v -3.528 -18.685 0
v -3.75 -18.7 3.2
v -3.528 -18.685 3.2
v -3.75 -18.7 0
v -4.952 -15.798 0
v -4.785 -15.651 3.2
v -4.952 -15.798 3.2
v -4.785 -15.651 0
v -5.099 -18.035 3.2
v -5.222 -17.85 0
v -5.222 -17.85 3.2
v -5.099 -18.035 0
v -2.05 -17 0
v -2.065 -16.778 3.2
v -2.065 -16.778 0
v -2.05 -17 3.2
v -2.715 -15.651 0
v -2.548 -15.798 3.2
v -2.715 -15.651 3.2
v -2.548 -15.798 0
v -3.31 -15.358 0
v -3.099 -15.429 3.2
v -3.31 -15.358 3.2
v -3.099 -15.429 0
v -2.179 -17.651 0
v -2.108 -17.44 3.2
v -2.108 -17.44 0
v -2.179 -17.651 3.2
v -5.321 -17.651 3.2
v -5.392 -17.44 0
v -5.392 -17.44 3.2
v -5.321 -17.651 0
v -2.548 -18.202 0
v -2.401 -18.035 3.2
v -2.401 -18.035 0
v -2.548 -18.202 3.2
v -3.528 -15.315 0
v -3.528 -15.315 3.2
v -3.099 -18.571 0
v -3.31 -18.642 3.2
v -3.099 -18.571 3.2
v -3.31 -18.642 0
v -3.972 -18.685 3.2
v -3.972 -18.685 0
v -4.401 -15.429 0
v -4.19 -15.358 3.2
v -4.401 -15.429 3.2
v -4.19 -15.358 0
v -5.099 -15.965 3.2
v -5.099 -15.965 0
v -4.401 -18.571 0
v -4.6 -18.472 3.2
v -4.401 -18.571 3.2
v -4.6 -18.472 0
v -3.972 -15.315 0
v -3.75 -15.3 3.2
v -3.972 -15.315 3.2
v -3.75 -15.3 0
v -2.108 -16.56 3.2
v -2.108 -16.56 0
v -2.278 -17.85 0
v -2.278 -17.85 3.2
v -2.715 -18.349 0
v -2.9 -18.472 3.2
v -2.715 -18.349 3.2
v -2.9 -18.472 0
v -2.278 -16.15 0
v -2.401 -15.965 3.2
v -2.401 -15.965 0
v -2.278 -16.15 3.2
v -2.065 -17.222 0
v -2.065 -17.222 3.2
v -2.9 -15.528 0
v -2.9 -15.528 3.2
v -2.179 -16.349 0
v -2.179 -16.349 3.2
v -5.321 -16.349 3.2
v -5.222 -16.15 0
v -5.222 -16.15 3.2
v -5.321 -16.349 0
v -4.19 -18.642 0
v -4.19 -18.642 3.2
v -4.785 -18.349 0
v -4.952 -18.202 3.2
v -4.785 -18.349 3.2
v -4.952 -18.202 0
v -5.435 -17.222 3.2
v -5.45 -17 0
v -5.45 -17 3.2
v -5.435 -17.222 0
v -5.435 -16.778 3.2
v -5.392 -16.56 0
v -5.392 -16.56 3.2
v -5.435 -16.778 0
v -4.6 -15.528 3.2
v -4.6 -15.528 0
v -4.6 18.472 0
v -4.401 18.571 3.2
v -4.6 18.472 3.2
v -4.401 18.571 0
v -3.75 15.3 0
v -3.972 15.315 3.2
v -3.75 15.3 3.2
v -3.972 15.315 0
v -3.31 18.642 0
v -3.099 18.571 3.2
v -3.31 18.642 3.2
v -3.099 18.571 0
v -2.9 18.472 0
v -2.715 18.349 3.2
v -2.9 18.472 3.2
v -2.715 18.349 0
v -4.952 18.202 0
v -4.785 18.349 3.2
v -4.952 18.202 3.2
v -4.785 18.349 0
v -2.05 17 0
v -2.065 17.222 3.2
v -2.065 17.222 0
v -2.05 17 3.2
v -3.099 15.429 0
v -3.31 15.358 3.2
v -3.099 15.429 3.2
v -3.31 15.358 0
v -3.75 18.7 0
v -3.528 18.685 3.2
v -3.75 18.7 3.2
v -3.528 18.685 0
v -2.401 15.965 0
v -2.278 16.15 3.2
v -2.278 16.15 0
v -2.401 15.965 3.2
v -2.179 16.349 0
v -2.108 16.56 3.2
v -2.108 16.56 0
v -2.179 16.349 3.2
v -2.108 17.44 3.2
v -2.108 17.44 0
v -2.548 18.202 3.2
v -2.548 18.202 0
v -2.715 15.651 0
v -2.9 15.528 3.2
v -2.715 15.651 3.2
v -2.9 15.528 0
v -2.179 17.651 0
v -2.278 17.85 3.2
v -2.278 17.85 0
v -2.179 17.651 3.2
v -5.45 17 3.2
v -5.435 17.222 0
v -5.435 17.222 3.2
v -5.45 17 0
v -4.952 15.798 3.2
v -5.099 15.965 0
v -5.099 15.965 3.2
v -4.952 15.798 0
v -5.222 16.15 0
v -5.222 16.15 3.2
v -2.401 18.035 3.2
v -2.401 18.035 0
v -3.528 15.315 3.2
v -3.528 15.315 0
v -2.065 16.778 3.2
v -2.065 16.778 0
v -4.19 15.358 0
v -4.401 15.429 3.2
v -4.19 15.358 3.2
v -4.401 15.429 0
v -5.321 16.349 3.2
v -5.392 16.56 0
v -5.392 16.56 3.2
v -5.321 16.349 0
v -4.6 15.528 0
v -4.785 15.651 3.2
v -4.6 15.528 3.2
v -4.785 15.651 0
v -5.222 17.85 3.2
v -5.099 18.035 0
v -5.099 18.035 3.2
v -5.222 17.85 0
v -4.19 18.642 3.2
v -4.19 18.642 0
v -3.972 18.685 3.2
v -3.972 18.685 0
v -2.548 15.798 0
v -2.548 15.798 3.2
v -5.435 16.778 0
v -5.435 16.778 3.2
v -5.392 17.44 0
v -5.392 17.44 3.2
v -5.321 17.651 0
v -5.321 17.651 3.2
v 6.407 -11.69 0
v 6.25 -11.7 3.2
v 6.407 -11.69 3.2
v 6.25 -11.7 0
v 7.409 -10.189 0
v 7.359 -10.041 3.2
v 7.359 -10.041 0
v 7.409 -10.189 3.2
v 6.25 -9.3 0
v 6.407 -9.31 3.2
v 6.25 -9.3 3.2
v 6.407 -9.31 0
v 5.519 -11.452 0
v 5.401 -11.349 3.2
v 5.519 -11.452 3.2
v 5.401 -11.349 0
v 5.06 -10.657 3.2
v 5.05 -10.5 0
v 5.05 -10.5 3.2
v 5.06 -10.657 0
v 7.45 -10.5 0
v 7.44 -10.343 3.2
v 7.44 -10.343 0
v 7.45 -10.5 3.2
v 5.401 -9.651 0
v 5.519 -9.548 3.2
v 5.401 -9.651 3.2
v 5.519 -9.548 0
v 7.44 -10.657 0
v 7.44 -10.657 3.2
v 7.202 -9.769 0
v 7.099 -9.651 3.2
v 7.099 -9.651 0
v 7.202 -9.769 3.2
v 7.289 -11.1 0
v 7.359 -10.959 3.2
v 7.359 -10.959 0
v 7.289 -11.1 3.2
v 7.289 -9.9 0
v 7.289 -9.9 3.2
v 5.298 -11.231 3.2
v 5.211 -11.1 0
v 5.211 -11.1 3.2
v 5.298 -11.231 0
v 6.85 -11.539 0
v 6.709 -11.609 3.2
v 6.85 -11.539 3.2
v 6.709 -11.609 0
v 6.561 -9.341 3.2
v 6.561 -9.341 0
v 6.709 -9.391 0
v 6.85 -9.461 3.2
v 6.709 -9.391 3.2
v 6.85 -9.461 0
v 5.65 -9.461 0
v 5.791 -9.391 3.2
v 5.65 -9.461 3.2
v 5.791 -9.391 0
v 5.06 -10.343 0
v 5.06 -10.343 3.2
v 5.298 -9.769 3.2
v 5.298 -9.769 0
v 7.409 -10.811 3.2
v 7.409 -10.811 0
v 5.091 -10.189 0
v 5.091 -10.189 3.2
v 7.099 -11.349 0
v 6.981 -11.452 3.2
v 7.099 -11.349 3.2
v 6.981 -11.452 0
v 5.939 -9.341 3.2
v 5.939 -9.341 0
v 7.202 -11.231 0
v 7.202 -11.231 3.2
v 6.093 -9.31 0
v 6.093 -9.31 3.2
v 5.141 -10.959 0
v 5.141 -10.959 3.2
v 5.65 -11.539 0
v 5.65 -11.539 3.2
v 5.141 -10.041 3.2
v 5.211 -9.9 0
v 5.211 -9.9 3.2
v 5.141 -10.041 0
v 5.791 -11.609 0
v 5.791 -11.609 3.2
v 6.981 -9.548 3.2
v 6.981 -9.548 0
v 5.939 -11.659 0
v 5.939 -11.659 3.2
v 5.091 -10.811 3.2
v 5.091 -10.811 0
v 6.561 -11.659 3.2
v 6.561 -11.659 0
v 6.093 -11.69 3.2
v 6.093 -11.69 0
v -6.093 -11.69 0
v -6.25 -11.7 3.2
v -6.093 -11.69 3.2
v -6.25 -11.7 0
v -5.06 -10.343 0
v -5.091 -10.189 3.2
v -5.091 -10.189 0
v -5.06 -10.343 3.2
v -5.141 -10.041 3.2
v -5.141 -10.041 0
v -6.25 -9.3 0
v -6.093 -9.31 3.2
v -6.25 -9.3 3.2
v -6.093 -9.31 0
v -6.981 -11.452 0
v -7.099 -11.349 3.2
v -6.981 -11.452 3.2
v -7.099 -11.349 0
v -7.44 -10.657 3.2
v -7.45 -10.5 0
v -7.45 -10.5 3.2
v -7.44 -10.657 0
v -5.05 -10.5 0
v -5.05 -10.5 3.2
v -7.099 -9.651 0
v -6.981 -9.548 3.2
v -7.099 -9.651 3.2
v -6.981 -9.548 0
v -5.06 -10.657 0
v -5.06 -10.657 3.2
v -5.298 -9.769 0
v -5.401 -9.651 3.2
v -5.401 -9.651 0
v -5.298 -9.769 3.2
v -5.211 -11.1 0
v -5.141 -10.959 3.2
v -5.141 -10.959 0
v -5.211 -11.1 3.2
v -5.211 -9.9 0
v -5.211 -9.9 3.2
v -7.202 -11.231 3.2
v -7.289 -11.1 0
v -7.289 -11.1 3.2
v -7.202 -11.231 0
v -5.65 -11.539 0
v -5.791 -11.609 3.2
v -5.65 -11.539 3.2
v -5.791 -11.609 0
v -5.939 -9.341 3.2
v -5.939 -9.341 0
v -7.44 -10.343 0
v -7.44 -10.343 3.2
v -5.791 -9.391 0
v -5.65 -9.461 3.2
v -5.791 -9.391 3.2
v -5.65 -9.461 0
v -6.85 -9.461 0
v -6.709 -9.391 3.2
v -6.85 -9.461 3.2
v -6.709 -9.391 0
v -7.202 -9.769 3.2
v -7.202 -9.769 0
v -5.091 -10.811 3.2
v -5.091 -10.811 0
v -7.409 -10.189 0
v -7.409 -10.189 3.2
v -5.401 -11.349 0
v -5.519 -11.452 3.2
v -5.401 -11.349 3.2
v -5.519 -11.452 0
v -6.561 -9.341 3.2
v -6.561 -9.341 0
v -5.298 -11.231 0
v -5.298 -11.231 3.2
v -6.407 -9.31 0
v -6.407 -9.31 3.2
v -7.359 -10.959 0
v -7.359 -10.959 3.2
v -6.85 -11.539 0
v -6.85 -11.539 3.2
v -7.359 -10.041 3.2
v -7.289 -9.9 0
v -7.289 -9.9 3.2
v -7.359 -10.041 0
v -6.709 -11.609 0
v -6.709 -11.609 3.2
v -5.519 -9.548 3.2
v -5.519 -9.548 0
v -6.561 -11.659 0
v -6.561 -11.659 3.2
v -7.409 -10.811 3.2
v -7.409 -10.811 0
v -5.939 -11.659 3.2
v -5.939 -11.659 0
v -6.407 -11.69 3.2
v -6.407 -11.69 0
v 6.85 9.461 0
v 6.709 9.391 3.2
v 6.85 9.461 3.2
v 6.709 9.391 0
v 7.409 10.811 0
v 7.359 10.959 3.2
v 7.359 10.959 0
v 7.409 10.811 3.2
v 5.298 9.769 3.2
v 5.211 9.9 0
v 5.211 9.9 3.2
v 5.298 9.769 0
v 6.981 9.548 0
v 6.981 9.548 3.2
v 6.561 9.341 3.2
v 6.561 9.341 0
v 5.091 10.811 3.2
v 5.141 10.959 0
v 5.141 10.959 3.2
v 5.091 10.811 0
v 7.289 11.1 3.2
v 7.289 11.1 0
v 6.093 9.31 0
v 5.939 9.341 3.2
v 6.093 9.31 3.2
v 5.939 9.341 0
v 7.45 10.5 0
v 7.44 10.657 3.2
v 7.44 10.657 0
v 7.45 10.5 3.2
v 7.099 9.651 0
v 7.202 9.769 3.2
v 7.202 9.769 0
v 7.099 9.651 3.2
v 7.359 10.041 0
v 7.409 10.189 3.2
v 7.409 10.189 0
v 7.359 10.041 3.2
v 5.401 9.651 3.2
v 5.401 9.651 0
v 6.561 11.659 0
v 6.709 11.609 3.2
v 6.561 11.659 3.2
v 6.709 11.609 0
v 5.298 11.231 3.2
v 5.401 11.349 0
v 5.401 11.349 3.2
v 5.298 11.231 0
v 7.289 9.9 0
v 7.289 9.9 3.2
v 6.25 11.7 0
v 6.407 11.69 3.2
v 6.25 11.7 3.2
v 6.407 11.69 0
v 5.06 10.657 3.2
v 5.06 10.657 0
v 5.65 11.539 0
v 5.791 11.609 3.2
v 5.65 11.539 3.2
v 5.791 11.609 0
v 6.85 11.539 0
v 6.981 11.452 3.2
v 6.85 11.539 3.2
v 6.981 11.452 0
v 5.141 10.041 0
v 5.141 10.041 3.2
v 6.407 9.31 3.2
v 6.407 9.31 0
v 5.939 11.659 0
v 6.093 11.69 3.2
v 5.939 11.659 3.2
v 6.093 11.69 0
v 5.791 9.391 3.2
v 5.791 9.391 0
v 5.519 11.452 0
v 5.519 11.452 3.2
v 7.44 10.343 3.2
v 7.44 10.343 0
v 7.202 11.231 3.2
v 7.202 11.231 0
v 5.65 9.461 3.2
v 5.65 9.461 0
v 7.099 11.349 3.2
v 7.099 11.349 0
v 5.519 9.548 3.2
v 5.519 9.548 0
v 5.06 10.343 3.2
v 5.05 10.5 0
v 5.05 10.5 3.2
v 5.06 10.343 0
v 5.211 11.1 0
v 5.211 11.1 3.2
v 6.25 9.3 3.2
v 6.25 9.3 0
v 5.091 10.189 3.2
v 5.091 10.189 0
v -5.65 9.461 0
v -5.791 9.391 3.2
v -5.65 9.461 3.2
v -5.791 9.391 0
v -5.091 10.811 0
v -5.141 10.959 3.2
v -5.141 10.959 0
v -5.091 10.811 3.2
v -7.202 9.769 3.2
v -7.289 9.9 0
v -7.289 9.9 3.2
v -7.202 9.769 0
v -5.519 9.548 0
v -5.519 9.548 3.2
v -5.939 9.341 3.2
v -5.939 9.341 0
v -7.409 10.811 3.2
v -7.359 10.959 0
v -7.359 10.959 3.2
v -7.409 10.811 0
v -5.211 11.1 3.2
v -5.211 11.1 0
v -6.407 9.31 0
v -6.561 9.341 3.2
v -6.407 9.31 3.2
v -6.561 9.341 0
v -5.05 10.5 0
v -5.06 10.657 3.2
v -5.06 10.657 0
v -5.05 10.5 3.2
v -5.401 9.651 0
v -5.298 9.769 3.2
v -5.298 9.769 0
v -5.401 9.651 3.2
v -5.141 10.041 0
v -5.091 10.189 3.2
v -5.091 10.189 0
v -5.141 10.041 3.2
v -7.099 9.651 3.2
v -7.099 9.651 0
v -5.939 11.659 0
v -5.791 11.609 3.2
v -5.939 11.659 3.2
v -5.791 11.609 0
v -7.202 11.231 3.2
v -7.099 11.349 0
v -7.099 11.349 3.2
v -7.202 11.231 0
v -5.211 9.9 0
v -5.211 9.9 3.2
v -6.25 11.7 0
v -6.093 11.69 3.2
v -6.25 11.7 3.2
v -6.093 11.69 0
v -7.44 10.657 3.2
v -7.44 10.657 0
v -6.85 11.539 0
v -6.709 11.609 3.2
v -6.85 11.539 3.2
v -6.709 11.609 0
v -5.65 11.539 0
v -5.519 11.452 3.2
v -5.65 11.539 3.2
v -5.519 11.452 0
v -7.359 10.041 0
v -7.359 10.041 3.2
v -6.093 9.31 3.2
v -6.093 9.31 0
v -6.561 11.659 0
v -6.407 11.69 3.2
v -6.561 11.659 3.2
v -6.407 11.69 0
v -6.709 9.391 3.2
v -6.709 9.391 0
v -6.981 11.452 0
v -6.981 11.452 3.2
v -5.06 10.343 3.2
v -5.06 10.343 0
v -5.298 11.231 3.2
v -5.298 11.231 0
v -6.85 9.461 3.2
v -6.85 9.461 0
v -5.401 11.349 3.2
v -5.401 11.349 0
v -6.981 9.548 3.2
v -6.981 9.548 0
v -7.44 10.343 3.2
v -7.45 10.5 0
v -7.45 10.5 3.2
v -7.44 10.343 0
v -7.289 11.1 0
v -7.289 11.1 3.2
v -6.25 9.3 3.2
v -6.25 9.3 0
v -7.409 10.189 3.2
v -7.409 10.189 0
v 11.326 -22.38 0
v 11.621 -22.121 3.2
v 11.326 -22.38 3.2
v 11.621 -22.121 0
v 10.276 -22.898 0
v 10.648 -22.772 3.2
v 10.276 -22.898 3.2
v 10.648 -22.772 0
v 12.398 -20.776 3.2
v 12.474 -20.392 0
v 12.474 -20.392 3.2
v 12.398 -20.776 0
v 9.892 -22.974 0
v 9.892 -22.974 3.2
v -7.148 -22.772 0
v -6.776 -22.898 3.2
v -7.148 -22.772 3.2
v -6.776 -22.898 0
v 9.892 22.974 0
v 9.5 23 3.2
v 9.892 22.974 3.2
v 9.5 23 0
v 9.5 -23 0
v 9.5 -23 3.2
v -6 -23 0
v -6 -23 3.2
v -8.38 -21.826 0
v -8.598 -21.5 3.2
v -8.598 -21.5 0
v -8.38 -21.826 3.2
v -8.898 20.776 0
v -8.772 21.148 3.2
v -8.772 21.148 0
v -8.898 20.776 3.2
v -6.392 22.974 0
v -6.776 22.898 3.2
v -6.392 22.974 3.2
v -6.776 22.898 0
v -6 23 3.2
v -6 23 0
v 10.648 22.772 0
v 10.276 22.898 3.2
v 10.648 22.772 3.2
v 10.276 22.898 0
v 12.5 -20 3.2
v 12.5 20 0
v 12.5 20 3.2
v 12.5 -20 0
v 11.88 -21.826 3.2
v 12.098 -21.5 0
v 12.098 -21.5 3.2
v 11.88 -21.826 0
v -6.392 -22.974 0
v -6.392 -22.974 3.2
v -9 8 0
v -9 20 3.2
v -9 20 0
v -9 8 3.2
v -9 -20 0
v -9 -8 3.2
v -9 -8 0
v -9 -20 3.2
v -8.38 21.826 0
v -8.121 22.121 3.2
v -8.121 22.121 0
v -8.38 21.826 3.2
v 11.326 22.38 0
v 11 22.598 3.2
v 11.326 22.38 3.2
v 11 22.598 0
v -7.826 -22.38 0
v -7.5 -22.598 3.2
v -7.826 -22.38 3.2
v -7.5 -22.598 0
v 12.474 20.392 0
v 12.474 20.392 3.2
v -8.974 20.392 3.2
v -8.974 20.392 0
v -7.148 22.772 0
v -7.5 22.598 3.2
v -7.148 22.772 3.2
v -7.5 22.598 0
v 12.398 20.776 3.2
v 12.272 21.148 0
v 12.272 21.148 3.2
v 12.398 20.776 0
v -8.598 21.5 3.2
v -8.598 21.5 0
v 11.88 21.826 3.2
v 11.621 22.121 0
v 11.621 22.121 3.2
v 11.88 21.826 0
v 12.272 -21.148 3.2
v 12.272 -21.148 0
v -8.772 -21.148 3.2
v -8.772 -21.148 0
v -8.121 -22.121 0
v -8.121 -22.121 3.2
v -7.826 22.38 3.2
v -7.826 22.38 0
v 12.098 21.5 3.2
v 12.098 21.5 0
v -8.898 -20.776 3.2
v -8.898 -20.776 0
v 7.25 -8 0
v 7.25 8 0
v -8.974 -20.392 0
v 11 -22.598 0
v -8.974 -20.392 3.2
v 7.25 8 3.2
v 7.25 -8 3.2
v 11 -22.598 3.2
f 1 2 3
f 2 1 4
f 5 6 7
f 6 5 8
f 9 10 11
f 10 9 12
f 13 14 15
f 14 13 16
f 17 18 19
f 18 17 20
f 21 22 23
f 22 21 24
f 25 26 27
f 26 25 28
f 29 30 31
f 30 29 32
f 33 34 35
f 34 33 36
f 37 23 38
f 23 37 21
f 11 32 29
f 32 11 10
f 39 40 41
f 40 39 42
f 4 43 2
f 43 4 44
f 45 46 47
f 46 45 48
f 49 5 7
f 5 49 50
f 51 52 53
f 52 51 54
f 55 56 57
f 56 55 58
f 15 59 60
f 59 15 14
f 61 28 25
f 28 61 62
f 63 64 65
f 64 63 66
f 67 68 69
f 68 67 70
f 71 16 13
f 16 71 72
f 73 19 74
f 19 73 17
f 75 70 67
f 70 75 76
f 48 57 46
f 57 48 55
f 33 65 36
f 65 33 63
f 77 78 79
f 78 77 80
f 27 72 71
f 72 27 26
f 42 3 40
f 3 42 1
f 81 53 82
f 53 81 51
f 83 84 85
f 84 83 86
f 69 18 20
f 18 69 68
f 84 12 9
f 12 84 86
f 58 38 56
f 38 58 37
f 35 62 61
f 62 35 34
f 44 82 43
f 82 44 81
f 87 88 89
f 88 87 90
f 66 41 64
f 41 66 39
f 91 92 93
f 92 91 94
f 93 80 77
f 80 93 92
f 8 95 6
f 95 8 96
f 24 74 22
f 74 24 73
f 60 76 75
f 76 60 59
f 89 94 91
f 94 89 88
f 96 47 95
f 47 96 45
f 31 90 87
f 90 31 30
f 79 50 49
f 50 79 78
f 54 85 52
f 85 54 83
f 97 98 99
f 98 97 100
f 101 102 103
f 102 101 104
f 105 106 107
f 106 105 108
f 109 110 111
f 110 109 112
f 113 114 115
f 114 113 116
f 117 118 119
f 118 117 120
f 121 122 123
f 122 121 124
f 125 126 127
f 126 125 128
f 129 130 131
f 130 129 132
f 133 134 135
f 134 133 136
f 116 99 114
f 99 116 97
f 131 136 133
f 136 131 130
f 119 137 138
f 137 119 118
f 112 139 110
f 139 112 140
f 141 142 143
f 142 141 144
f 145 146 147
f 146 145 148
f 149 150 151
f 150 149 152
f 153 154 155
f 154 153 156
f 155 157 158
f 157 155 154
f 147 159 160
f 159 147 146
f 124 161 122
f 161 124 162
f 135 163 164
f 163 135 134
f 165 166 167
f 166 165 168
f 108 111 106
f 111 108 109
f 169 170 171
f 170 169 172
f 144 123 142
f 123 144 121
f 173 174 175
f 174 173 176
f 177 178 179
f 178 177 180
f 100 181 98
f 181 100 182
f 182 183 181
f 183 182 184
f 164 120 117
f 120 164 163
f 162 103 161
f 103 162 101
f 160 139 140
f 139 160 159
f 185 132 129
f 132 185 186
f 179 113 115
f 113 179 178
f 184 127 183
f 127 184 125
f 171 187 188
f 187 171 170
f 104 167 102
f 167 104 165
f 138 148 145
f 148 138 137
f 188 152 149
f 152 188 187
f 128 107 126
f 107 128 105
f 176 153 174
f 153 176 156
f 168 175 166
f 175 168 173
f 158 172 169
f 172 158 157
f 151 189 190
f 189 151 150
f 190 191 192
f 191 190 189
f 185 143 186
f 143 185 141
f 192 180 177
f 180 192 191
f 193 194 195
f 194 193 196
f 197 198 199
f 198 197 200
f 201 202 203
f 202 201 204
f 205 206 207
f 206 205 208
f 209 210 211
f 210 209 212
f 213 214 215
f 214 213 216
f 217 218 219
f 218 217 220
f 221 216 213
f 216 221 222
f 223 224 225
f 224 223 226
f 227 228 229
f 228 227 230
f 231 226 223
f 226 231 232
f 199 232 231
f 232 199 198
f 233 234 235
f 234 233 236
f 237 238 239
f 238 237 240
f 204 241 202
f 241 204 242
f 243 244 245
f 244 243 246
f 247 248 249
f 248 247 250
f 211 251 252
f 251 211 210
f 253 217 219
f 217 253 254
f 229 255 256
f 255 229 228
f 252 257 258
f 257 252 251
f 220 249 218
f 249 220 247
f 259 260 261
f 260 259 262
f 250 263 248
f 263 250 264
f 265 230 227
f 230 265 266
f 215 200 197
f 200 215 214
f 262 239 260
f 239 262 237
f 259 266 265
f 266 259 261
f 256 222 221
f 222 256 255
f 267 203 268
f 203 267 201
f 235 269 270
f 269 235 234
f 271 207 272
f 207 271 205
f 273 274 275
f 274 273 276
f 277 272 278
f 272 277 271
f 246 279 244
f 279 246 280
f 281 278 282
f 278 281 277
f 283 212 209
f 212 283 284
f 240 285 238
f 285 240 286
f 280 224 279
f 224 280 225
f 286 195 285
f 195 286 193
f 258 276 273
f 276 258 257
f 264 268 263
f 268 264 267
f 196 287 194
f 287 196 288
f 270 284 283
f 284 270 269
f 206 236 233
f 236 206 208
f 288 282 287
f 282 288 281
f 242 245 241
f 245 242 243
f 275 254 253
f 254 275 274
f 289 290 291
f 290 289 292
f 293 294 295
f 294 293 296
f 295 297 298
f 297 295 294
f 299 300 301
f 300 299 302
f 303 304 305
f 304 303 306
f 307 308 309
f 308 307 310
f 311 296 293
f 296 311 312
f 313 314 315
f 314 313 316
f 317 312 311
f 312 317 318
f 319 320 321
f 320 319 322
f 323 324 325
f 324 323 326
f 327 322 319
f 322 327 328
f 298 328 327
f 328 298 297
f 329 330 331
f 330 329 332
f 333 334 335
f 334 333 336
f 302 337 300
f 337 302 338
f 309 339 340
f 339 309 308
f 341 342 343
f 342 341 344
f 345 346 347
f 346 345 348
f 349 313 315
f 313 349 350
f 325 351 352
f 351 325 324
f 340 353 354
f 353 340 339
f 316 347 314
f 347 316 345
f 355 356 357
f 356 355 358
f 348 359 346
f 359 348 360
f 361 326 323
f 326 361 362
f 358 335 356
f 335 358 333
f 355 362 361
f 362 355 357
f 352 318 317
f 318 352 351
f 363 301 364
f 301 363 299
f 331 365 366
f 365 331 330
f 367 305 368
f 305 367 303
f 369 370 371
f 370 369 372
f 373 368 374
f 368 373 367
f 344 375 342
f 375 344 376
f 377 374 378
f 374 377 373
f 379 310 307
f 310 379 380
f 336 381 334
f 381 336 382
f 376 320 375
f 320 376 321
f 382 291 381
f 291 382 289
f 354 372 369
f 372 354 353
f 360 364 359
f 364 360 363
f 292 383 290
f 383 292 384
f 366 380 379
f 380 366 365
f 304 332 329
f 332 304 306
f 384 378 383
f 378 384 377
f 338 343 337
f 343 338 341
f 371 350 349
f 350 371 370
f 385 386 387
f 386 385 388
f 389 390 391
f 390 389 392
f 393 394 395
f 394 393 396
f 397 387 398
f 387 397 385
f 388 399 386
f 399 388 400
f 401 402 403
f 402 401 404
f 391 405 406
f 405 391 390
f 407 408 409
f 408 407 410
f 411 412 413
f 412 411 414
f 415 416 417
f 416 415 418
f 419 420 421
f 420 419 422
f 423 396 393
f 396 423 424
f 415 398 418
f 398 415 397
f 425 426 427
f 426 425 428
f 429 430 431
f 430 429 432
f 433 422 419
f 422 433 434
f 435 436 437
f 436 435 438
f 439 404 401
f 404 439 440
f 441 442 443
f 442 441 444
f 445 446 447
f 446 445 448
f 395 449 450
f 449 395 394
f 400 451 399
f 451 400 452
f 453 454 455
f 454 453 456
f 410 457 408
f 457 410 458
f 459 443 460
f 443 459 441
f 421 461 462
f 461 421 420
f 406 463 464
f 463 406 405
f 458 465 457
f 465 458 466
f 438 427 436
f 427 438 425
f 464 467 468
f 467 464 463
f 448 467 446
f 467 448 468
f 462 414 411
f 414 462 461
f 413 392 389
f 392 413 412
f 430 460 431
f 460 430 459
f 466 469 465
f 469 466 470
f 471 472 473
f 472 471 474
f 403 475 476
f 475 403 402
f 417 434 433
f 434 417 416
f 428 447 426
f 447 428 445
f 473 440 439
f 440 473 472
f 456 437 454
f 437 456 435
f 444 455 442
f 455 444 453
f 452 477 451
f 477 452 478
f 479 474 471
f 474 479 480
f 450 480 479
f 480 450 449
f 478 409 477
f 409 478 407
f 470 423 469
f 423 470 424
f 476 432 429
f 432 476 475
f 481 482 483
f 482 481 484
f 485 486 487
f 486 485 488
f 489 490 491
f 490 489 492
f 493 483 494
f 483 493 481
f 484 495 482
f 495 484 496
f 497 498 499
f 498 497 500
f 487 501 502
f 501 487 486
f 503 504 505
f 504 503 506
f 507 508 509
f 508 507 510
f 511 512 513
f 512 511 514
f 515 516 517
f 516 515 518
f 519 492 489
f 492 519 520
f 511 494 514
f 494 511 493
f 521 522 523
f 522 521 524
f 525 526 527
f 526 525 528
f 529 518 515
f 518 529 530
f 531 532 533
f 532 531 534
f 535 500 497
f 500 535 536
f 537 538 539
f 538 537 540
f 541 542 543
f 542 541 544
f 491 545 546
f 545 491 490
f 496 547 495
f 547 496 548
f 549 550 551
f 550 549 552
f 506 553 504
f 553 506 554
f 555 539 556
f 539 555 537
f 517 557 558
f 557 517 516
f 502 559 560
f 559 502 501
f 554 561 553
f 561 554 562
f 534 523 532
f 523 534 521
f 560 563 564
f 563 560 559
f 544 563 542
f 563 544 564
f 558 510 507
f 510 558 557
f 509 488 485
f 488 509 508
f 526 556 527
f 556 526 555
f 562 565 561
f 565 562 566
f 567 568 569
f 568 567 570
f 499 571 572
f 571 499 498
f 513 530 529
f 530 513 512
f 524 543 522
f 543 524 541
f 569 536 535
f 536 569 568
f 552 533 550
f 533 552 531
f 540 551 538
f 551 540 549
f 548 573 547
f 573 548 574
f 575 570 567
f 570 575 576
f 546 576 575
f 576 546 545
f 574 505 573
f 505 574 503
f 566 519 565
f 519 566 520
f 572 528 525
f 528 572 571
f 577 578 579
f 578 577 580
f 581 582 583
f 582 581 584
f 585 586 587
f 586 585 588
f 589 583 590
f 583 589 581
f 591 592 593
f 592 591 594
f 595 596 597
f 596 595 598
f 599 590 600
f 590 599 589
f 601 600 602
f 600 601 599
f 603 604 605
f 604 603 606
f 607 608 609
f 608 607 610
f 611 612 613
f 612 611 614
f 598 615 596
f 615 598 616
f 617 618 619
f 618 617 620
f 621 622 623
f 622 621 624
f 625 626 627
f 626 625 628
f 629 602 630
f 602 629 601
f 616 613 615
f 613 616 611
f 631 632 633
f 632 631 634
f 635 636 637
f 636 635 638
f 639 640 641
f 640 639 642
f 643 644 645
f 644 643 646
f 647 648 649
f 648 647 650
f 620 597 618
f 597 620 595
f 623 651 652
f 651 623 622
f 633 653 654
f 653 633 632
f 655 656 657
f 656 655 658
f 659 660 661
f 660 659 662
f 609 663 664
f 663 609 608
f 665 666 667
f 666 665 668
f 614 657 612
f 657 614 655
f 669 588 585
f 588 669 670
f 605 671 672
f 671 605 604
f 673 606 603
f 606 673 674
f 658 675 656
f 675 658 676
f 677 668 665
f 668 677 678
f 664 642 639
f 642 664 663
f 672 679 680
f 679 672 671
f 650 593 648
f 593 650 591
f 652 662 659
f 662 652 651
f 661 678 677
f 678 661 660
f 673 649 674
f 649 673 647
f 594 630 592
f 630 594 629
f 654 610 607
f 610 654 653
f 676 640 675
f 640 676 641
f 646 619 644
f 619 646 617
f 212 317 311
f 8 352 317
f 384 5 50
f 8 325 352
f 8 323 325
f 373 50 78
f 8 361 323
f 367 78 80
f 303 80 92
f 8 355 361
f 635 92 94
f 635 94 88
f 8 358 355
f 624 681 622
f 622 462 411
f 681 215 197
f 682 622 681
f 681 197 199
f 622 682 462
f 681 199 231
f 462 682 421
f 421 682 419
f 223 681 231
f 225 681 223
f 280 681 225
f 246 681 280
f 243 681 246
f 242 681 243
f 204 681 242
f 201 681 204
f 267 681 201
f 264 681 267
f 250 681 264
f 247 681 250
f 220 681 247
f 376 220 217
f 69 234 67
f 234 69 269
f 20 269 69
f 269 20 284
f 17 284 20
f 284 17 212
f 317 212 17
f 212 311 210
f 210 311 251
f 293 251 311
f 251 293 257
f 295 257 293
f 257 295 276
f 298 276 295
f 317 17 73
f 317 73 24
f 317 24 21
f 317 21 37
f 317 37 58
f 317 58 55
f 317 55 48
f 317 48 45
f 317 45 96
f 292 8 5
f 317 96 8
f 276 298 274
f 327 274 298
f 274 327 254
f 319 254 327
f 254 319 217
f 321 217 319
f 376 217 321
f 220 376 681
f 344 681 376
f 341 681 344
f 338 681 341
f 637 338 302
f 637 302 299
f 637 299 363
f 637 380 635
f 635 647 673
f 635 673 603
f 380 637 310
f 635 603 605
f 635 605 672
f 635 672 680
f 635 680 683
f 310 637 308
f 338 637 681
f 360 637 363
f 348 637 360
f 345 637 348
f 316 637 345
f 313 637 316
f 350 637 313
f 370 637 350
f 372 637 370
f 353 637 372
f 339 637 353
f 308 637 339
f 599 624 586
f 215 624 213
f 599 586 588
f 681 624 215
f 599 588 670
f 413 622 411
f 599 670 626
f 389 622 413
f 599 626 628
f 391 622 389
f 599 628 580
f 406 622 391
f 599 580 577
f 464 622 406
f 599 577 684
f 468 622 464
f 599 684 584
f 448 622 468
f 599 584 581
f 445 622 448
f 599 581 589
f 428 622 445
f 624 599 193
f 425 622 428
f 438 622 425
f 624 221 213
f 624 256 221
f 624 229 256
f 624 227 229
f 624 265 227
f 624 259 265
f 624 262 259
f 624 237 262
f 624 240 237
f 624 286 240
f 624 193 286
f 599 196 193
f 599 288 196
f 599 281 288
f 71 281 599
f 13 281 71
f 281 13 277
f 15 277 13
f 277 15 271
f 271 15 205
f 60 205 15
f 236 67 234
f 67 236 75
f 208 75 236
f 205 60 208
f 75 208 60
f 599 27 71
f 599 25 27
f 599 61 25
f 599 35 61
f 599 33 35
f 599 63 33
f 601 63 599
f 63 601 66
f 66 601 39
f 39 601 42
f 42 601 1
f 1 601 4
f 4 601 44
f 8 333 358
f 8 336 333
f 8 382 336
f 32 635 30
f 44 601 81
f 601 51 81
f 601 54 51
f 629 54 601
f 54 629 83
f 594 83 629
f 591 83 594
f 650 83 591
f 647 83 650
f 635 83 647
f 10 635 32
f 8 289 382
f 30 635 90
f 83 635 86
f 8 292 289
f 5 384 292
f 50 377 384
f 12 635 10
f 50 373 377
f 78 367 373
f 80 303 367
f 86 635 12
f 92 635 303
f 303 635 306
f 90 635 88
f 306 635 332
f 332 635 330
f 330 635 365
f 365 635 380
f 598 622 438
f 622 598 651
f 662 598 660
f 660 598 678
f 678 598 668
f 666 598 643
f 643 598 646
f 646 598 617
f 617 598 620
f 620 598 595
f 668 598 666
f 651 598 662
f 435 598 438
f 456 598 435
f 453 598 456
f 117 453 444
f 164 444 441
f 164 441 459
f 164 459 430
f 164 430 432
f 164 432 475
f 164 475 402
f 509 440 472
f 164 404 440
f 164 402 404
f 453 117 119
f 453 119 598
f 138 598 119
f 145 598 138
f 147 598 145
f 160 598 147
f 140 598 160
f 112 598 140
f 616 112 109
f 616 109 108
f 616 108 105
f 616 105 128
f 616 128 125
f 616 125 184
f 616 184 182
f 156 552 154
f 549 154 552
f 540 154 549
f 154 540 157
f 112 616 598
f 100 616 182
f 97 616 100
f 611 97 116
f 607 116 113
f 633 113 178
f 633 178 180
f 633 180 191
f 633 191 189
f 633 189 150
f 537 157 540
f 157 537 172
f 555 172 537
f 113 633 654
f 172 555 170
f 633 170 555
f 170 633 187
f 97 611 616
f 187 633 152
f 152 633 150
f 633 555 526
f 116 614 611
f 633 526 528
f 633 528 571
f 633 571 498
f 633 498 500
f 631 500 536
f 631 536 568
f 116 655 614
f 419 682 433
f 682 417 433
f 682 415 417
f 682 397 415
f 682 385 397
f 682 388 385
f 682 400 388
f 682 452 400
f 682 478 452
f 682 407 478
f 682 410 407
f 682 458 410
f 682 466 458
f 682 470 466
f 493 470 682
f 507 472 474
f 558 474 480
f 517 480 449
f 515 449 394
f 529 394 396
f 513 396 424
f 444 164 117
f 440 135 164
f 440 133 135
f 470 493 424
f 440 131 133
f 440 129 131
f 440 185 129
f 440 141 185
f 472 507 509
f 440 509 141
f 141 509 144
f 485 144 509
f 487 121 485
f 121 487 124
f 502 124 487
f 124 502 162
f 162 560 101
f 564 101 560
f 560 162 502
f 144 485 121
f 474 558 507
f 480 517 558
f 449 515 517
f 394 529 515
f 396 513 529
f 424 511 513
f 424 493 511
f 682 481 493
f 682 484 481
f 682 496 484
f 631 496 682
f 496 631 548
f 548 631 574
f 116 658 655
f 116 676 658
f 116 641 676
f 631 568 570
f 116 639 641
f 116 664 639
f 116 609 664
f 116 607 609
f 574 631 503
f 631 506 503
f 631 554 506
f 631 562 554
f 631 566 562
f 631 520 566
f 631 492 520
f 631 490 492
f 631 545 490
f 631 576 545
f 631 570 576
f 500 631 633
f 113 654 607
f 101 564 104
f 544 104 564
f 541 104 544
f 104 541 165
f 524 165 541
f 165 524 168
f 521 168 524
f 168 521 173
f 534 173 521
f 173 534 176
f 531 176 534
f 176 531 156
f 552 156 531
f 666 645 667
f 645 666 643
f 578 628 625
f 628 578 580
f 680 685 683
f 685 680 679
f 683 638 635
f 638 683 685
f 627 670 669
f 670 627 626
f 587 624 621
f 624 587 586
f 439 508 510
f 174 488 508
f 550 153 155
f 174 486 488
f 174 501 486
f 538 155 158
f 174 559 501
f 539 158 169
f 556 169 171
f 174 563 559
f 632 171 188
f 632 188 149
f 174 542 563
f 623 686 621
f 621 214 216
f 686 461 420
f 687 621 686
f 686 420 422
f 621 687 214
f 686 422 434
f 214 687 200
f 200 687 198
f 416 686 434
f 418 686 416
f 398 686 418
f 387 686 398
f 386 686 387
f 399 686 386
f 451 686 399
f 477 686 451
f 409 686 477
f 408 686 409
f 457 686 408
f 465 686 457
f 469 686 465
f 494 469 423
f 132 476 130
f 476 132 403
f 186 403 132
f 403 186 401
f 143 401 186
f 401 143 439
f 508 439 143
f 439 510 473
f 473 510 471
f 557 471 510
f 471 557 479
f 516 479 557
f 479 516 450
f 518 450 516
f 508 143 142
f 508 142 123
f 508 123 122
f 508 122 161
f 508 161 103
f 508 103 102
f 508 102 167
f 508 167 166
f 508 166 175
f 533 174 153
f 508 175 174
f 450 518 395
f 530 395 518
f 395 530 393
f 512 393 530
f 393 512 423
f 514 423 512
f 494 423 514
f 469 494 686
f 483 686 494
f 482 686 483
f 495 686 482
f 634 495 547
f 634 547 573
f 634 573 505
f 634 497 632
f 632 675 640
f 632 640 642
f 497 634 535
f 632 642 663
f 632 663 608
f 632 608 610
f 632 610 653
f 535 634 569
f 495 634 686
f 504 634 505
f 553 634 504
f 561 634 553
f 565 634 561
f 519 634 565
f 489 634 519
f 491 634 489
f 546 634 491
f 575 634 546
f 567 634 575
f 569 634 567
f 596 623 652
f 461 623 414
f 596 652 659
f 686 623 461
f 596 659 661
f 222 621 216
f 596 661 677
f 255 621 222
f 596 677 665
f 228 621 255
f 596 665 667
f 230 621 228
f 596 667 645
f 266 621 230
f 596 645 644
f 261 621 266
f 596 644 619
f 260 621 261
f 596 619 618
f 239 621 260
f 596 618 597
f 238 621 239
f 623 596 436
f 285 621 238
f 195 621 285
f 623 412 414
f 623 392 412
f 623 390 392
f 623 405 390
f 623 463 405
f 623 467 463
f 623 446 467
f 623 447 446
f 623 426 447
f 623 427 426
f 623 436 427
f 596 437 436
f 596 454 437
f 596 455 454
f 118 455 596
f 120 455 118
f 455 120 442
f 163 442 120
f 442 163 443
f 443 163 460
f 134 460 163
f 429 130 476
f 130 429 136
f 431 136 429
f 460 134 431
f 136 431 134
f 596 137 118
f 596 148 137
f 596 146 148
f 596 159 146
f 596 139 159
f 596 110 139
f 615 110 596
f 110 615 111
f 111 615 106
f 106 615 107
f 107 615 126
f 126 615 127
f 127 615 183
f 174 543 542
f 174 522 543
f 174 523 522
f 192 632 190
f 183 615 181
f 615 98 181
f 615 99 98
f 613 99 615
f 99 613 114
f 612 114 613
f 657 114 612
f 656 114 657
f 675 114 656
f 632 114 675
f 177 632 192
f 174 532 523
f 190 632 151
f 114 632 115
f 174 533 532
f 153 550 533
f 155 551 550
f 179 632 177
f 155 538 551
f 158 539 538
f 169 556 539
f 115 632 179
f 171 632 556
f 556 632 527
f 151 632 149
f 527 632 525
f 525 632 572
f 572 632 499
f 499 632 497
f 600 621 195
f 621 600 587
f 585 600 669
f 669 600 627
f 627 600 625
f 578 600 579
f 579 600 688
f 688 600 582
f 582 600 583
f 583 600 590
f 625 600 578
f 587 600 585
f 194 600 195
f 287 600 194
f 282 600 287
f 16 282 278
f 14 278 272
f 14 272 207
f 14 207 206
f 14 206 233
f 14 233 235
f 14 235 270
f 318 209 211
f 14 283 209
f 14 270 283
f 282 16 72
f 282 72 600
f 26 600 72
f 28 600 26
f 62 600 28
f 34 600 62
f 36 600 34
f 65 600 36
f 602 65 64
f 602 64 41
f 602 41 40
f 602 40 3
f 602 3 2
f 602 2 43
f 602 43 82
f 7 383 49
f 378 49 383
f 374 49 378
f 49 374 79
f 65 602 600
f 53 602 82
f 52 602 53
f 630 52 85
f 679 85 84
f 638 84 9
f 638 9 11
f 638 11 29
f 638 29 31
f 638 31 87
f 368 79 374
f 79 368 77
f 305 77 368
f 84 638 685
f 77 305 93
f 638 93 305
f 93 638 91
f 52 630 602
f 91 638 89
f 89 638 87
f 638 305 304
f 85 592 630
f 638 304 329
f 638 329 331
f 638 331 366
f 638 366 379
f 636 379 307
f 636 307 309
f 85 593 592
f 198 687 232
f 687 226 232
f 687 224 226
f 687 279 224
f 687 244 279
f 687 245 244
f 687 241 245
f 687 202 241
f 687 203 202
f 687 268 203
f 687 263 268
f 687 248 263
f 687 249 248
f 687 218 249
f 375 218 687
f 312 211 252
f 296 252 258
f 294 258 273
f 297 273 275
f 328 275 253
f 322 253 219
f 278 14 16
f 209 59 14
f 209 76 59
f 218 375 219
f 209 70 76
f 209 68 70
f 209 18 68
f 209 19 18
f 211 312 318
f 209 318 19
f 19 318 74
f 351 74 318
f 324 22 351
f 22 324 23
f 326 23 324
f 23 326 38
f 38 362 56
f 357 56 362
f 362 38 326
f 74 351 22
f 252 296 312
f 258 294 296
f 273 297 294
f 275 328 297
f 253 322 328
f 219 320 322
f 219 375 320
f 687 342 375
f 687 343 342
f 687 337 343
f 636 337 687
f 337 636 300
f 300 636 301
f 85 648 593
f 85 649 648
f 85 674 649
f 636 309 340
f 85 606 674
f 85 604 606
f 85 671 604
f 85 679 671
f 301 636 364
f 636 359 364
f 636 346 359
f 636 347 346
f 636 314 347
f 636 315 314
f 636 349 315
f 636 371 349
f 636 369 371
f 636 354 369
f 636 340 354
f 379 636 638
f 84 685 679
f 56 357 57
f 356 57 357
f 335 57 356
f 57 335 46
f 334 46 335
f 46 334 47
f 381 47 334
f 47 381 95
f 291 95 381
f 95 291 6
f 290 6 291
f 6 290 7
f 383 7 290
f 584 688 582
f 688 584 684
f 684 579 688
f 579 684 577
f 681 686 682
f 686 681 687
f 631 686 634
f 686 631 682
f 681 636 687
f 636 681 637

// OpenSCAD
// Luca P2S camera-to-chassis adapter.  Units: mm.
//
// Purpose: bridge the two existing chassis mast holes (M3, 34 mm pitch) to
// the four-hole board pattern of a Raspberry Pi Camera Module 3 (IMX708;
// M2, 21 x 12.5 mm). This part deliberately does not alter the chassis.
//
// Coordinate convention inside adapter() matches the P2S CAD: X points
// fore/aft, Y is lateral, and Z is vertical. The final transform below puts
// the broad face flat on the print bed. The installed hole axes are along X.

$fn = 48;

// --- Verified-from-CAD interface dimensions ---
chassis_hole_pitch_y = 34;       // centres at Y = +/-17
chassis_hole_z = 32;
chassis_screw_clearance = 3.4;   // M3 clearance

camera_hole_pitch_y = 21;        // centres at Y = +/-10.5
camera_hole_pitch_z = 12.5;      // centres at Z = 22 and 34.5
camera_screw_clearance = 2.4;    // M2 clearance; do not force a self-tapper
camera_hole_z = 28.25;

// Rear FFC connector clearance, based on the matching opening in the existing
// P2S Camera_Insert. The opening lets the camera PCB sit on the adapter's
// perimeter rails instead of bearing on its ribbon connector.
connector_relief_width_y = 16;
connector_relief_height_z = 22;
connector_relief_z = 32;

// --- Print geometry ---
plate_thickness = 3.2;
plate_width_y = 46;
// The top edge ends 1.3 mm beyond the upper M2-hole edge. This removes the
// camera-side obstruction while retaining a printable screw-hole rim.
plate_height_z = 21.5;
plate_center_z = 26.5;
corner_radius = 3;
edge_margin = 3;

module rounded_plate() {
    // Minkowski keeps material around the outer chassis holes while softening
    // the corners; $fn is intentionally modest for an easy-to-slice STL.
    linear_extrude(height = plate_thickness, center = true)
        offset(r = corner_radius)
            // This local X dimension becomes global Z after the rotation in
            // adapter(); local Y remains global Y.
            square([plate_height_z - 2 * corner_radius,
                    plate_width_y - 2 * corner_radius], center = true);
}

module x_hole(diameter, y, z) {
    // Rotate the cylinder at its local origin, then place its X-axis bore in
    // the assembly's Y-Z plane. Translating before rotating would incorrectly
    // rotate the requested Y-Z coordinates as well.
    translate([0, y, z])
        rotate([0, 90, 0])
            cylinder(h = plate_thickness + 2, d = diameter, center = true);
}

module adapter() {
    difference() {
        // OpenSCAD's extrude is along Z.  Rotate to make the plate lie in Y-Z,
        // putting every fastener axis along X as on the existing parts.
        // Place the plate at the camera-pattern centre in chassis coordinates.
        // The holes below are already expressed in those same coordinates.
        translate([0, 0, plate_center_z])
            rotate([0, 90, 0]) rounded_plate();

        // Through-window for the rear camera connector and its cable. This
        // leaves 3 mm side rails and a 5.25 mm lower support ledge.
        translate([0, 0, connector_relief_z])
            cube([plate_thickness + 2,
                  connector_relief_width_y,
                  connector_relief_height_z], center = true);

        // Existing chassis mast interface: M3 clearance, two holes.
        for (y = [-chassis_hole_pitch_y / 2, chassis_hole_pitch_y / 2])
            x_hole(chassis_screw_clearance, y, chassis_hole_z);

        // Raspberry Pi Camera Module 3 / IMX708 interface: M2 clearance.
        for (y = [-camera_hole_pitch_y / 2, camera_hole_pitch_y / 2])
            for (z = [camera_hole_z - camera_hole_pitch_z / 2,
                      camera_hole_z + camera_hole_pitch_z / 2])
                x_hole(camera_screw_clearance, y, z);
    }
}

// Exported orientation: broad face on the print bed, with the thin dimension
// along print Z. The adapter() module itself remains in chassis coordinates.
translate([camera_hole_z, 0, plate_thickness / 2])
    rotate([0, -90, 0]) adapter();
